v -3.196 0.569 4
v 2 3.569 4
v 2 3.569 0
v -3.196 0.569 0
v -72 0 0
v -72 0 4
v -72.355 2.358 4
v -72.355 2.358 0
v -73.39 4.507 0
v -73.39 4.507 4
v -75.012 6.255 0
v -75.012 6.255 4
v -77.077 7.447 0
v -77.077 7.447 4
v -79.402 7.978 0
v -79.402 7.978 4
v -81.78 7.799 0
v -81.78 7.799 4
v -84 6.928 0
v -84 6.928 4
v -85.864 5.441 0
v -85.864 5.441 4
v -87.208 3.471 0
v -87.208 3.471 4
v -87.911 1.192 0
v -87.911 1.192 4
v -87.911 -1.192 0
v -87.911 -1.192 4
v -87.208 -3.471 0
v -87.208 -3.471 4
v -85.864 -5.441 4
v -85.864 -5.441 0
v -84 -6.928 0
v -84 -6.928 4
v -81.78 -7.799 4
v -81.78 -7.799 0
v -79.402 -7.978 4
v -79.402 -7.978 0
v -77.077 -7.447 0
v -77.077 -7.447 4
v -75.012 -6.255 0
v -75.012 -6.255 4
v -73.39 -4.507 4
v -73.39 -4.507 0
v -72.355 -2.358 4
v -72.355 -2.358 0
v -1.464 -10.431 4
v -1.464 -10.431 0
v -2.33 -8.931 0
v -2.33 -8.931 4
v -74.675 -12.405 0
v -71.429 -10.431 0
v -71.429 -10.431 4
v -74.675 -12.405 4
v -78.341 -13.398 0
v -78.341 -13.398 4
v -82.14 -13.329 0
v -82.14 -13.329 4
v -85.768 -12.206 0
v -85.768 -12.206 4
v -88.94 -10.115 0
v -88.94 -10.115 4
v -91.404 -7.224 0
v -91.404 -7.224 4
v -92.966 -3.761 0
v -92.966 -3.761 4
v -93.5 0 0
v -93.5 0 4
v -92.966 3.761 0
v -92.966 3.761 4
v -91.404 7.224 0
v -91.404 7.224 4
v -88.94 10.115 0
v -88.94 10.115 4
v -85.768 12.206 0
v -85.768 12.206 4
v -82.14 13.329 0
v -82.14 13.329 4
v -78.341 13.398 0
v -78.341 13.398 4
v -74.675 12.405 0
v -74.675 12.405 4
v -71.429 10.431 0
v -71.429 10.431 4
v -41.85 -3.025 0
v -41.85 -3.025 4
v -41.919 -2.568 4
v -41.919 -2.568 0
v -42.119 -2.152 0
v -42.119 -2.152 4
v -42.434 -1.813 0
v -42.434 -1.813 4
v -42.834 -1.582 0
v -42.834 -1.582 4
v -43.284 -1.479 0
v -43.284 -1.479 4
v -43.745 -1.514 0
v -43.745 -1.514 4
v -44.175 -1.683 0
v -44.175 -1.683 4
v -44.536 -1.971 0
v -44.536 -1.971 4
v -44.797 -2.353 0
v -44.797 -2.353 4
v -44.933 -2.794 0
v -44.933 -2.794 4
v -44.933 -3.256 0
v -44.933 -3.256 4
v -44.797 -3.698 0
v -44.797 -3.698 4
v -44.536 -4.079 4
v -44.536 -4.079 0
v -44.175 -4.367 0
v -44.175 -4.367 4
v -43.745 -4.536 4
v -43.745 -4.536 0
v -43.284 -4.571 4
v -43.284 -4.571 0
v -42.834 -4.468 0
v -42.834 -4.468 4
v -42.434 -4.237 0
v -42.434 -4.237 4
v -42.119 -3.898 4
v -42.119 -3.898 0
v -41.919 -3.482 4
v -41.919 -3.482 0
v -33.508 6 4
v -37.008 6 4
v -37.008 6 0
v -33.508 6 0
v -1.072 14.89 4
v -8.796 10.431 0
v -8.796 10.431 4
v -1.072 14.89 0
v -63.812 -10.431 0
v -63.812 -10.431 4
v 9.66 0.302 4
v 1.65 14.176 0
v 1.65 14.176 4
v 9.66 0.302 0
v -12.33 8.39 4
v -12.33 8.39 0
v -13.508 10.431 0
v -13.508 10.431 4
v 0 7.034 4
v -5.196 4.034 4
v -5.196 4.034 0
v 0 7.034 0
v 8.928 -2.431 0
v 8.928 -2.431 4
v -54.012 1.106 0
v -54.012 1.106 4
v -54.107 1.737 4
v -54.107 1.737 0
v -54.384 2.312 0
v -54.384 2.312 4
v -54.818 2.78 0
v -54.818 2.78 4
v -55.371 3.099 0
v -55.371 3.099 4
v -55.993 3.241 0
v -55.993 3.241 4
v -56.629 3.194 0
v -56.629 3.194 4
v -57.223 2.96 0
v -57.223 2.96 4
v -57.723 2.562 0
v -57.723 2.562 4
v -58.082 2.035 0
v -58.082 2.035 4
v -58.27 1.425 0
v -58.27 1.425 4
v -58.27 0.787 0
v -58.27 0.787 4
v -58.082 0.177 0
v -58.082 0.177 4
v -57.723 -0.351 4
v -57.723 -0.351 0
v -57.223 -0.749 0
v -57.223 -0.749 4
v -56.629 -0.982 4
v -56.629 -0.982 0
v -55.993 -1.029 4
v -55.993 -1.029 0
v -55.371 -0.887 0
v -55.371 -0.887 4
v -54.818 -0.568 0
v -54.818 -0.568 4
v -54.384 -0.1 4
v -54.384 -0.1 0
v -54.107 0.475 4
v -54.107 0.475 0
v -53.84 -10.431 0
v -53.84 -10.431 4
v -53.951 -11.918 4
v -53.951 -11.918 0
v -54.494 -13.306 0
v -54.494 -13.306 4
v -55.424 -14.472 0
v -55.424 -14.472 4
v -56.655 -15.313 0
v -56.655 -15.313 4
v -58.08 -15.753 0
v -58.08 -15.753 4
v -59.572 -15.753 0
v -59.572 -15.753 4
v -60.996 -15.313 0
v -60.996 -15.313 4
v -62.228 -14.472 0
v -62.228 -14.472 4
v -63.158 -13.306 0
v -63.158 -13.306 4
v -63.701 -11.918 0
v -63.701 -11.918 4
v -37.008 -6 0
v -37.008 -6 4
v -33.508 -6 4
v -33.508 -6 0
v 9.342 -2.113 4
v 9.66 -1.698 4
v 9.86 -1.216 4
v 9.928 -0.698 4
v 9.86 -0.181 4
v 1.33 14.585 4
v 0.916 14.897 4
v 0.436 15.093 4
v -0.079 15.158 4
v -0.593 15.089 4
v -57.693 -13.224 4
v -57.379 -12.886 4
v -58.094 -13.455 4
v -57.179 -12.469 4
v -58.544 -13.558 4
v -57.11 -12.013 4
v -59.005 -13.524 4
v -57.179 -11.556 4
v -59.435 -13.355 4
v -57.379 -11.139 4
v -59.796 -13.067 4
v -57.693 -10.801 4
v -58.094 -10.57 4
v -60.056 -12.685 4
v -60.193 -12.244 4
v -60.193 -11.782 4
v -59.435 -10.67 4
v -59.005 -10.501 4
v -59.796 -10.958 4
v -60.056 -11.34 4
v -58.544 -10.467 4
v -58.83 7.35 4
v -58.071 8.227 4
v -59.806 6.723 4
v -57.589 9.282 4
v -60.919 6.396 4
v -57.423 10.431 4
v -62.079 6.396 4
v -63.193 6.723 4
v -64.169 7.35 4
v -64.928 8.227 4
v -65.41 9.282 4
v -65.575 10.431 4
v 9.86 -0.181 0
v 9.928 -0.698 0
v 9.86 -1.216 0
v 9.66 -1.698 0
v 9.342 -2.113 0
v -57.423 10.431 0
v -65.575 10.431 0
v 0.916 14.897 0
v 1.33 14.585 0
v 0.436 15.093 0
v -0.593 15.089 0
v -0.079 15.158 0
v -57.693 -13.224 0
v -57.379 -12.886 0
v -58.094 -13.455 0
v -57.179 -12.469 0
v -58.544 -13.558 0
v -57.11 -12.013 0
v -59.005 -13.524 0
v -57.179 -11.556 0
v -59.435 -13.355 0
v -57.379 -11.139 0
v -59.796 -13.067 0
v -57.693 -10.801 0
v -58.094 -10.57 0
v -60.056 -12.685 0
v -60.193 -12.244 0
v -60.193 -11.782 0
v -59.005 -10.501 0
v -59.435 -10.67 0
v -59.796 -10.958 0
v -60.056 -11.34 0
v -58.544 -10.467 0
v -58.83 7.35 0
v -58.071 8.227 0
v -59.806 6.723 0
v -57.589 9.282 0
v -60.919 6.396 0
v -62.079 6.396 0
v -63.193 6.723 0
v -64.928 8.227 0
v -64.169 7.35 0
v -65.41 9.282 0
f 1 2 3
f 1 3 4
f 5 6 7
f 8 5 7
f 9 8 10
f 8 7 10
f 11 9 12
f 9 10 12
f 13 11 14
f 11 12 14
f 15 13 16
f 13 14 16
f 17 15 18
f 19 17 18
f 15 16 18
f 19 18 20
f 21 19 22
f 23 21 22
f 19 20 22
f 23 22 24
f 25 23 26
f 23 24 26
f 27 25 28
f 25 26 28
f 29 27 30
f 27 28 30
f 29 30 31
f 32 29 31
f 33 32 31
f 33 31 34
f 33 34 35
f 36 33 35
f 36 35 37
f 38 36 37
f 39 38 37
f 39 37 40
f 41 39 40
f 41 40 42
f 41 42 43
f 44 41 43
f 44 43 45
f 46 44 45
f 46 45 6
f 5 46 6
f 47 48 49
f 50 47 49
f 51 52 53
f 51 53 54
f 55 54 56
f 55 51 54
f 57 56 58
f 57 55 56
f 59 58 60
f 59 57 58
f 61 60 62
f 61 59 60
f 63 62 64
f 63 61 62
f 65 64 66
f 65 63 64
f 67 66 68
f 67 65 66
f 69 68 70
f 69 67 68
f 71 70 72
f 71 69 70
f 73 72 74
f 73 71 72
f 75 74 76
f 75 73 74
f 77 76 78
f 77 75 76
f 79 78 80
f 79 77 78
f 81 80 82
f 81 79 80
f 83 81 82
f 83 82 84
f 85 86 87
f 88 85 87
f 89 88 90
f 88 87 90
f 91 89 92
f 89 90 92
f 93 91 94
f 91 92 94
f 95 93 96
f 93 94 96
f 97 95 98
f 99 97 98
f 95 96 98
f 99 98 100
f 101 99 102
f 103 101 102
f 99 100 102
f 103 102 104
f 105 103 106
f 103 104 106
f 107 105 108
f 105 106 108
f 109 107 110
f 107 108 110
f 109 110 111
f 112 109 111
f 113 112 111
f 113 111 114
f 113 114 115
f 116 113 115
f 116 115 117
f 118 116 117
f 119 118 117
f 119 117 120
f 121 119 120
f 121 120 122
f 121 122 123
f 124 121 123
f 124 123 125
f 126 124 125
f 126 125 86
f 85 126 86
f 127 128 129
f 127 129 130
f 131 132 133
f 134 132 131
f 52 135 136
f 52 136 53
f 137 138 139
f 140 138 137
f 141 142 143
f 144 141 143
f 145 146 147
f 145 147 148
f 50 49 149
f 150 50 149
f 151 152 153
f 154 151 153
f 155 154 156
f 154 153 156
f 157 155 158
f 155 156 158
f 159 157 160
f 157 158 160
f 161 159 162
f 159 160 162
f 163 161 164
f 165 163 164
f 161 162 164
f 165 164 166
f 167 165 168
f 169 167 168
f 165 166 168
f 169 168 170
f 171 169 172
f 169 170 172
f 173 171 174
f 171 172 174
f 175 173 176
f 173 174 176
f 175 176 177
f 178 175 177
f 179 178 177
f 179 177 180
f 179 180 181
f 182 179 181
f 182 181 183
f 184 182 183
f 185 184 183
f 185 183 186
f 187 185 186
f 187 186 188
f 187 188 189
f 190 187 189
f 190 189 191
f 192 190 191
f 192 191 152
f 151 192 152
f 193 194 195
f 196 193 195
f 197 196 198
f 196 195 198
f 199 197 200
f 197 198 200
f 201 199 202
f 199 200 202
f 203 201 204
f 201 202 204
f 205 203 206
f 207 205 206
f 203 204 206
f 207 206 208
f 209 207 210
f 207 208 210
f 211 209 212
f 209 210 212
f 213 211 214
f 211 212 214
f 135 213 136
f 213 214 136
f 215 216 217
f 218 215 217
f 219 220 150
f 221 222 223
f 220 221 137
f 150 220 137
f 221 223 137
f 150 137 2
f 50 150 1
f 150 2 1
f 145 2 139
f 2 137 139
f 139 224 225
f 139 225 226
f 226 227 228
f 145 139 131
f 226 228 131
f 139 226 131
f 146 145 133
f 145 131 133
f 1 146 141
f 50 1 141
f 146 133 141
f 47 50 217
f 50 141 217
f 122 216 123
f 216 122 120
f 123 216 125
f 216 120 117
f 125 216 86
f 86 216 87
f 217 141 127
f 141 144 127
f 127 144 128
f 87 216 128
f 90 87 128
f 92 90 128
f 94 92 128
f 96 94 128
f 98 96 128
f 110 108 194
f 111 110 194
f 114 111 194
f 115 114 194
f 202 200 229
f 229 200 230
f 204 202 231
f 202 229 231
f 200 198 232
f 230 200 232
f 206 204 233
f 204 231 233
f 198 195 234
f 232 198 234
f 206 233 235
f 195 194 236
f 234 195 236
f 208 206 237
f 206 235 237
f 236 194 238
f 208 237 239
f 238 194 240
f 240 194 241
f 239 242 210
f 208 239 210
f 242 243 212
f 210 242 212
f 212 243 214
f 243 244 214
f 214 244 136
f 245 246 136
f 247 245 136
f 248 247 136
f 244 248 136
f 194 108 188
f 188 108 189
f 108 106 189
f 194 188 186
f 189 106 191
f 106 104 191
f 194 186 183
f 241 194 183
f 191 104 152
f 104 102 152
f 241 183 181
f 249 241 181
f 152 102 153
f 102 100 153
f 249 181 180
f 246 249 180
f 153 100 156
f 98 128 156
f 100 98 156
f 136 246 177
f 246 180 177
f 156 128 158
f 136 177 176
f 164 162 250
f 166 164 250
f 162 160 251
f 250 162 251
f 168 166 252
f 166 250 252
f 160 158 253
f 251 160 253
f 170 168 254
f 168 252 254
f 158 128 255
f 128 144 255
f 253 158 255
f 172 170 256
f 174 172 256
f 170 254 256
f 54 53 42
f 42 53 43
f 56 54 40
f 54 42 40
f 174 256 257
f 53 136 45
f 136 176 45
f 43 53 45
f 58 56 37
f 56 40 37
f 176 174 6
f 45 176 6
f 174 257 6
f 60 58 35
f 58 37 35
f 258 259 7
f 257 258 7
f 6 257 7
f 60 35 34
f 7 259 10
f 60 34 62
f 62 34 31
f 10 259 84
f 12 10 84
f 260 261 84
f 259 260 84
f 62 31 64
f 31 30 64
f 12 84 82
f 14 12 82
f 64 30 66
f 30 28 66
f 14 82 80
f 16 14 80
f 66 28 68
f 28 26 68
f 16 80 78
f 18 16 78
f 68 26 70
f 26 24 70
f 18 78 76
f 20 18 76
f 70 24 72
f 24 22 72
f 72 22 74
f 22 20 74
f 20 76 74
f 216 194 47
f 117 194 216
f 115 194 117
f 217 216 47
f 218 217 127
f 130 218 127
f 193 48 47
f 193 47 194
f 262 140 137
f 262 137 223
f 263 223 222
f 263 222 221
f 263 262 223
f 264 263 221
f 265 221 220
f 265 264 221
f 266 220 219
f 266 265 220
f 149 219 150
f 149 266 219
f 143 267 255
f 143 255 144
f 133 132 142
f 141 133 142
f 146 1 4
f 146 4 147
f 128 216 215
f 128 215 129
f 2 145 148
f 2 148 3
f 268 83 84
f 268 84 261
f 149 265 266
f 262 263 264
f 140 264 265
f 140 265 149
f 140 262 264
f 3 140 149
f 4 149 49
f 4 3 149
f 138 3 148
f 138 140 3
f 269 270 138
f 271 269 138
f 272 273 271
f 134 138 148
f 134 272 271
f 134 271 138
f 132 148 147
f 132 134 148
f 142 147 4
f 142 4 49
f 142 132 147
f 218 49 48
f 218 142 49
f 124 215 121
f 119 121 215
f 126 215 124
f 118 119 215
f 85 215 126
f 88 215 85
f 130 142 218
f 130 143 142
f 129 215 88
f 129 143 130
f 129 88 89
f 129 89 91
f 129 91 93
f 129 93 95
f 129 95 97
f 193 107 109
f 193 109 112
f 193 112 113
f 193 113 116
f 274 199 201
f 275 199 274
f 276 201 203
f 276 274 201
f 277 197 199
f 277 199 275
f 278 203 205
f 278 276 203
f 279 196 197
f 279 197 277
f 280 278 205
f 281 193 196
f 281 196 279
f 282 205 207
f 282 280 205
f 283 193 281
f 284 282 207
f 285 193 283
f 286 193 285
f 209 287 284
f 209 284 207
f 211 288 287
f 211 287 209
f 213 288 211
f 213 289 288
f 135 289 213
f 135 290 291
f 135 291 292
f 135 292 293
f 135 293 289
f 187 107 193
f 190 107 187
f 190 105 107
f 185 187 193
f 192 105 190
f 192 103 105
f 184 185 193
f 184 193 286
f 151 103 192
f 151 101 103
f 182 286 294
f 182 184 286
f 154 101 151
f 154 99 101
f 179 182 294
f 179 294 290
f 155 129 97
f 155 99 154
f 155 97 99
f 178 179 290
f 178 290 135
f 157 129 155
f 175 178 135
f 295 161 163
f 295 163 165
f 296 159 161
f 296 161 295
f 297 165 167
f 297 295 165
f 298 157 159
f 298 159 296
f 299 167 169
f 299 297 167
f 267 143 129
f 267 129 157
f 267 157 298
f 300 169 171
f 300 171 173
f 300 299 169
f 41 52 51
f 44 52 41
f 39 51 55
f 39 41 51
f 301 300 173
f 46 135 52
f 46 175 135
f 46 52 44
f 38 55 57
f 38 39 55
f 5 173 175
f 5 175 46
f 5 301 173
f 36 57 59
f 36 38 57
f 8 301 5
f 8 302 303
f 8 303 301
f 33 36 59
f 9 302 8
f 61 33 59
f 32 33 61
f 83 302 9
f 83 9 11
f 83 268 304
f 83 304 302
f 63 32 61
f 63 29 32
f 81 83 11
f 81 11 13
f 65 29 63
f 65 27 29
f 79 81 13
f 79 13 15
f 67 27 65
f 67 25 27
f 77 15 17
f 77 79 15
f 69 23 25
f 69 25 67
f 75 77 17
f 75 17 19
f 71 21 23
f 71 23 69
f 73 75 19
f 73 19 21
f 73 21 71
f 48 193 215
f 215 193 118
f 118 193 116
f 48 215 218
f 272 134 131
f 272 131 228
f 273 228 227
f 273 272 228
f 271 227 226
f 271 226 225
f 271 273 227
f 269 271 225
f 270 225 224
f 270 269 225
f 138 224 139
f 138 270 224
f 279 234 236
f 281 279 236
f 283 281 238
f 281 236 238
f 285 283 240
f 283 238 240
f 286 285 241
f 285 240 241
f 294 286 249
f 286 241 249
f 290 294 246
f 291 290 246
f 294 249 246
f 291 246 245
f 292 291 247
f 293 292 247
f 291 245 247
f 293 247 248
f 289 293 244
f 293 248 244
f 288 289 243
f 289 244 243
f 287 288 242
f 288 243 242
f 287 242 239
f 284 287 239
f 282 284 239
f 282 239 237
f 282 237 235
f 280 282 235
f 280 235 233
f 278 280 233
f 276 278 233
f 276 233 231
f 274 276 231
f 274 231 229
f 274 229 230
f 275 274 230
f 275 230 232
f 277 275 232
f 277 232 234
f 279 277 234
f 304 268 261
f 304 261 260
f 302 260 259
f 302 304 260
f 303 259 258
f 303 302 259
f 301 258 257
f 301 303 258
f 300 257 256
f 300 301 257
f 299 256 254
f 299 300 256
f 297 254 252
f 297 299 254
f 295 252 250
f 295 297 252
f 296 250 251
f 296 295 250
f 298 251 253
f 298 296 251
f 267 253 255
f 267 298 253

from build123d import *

# Parameters (mm, degrees)
AUFSATZ_LINEAR_AUSTRAGEN1_DEPTH = 4
SCHNITT_LINEAR_AUSTRAGEN1_REACH = 6
SKIZZE2_R                       = 8
SKIZZE2_R_2                     = 2.141321697
SCHNITT_LINEAR_START            = -4
SCHNITT_LINEAR_AUSTRAGEN2_DEPTH = 4
AUFSATZ_LINEAR_AUSTRAGEN3_DEPTH = 4
SCHNITT_LINEAR_AUSTRAGEN3_REACH = 6
SKIZZE5_W                       = 3.5
SKIZZE5_H                       = 12
AUFSATZ_LINEAR_AUSTRAGEN4_DEPTH = 4
SKIZZE7_R                       = 1.55
SCHNITT_LINEAR_AUSTRAGEN4_DEPTH = 10


with BuildPart() as part:
    # Skizze1 → Aufsatz-Linear austragen1 (new body)
    with BuildSketch(Plane.XY):
        with BuildLine():
            Line((8.570550732, -10.430515814), (-71.429449268, -10.430515814))
            ThreePointArc((-71.429449268, -10.430515814), (-93.5, 0), (-71.429449268, 10.430515814))
            Line((-71.429449268, 10.430515814), (-65.575289804, 10.430515814))
            ThreePointArc((-65.575289804, 10.430515814), (-61.49939442, 6.35462043), (-57.423499036, 10.430515814))
            Line((-57.423499036, 10.430515814), (8.570550732, 10.430515814))
            ThreePointArc((8.570550732, 10.430515814), (19.001066546, 0), (8.570550732, -10.430515814))
        make_face()
    extrude(amount=AUFSATZ_LINEAR_AUSTRAGEN1_DEPTH)

    # Skizze2 → Schnitt-Linear austragen1 (cut, up to next)
    with BuildSketch(Plane.XY.offset(4), mode=Mode.PRIVATE) as schnitt_linear_austragen1_sk1:
        with Locations((-80, 0)):
            Circle(SKIZZE2_R)
    schnitt_linear_austragen1_tool1 = extrude(schnitt_linear_austragen1_sk1.sketch, amount=-SCHNITT_LINEAR_AUSTRAGEN1_REACH, mode=Mode.PRIVATE) & part.part
    add(schnitt_linear_austragen1_tool1.solids().sort_by_distance((-80, 0, 4))[0], mode=Mode.SUBTRACT)
    # Skizze2 → Schnitt-Linear austragen1 (cut, up to next)
    with BuildSketch(Plane.XY.offset(4), mode=Mode.PRIVATE) as schnitt_linear_austragen1_sk2:
        with Locations((-56.152824314, 1.105869461)):
            Circle(SKIZZE2_R_2)
    schnitt_linear_austragen1_tool2 = extrude(schnitt_linear_austragen1_sk2.sketch, amount=-SCHNITT_LINEAR_AUSTRAGEN1_REACH, mode=Mode.PRIVATE) & part.part
    add(schnitt_linear_austragen1_tool2.solids().sort_by_distance((-56.152824, 1.105869, 4))[0], mode=Mode.SUBTRACT)
    # Skizze2 → Schnitt-Linear austragen1 (cut, up to next)
    with BuildSketch(Plane.XY.offset(4), mode=Mode.PRIVATE) as schnitt_linear_austragen1_sk3:
        Polygon((-5.196152423, 4.033585801), (0, 7.033585801), (2, 3.569484186), (-3.196152423, 0.569484186), align=None)
    schnitt_linear_austragen1_tool3 = extrude(schnitt_linear_austragen1_sk3.sketch, amount=-SCHNITT_LINEAR_AUSTRAGEN1_REACH, mode=Mode.PRIVATE) & part.part
    add(schnitt_linear_austragen1_tool3.solids().sort_by_distance((-1.598076, 3.801535, 4))[0], mode=Mode.SUBTRACT)

    # Skizze3 → Schnitt-Linear austragen2 (cut)
    with BuildSketch(Plane.XY.offset(4).offset(SCHNITT_LINEAR_START)):
        Polygon((12.98673942, 30.628285162), (33.019811303, -4.070013171), (4.402698179, -20.592111136), (-2.330127019, -8.930515814), (8.92820323, -2.430515814), (-1.07179677, 14.889992262), (-12.330127019, 8.389992262), (-15.630373703, 14.106187196), align=None)
    extrude(amount=SCHNITT_LINEAR_AUSTRAGEN2_DEPTH, mode=Mode.SUBTRACT)

    # Skizze4 → Aufsatz-Linear austragen3 (add)
    with BuildSketch(Plane.XY):
        with BuildLine():
            Line((-8.795836552, 10.430515814), (-1.07179677, 14.889992262))
            ThreePointArc((-1.07179677, 14.889992262), (0.435735022, 15.092552947), (1.649755119, 14.176126114))
            Line((1.649755119, 14.176126114), (9.66025479, 0.301533691))
            ThreePointArc((9.66025479, 0.301533691), (9.860054688, -1.216103823), (8.92820323, -2.430515814))
            Line((8.92820323, -2.430515814), (1.502883158, 10.430515814))
            Line((1.502883158, 10.430515814), (-8.795836552, 10.430515814))
        make_face()
    extrude(amount=AUFSATZ_LINEAR_AUSTRAGEN3_DEPTH)

    # Skizze5 → Schnitt-Linear austragen3 (cut, up to next)
    with BuildSketch(Plane.XY.offset(4), mode=Mode.PRIVATE) as schnitt_linear_austragen3_sk1:
        with Locations((-35.258223841, 0)):
            Rectangle(SKIZZE5_W, SKIZZE5_H)
    schnitt_linear_austragen3_tool1 = extrude(schnitt_linear_austragen3_sk1.sketch, amount=-SCHNITT_LINEAR_AUSTRAGEN3_REACH, mode=Mode.PRIVATE) & part.part
    add(schnitt_linear_austragen3_tool1.solids().sort_by_distance((-35.258224, 0, 4))[0], mode=Mode.SUBTRACT)

    # Skizze6 → Aufsatz-Linear austragen4 (add)
    with BuildSketch(Plane.XY.offset(4)):
        with BuildLine():
            Line((-63.811678178, -10.430515814), (-53.840299994, -10.430515814))
            ThreePointArc((-53.840299994, -10.430515814), (-58.825989086, -15.808542635), (-63.811678178, -10.430515814))
        make_face()
    extrude(amount=-AUFSATZ_LINEAR_AUSTRAGEN4_DEPTH)

    # Skizze7 → Schnitt-Linear austragen4 (cut)
    with BuildSketch(Plane.XY.offset(4)):
        with Locations((-58.659847502, -12.012547734)):
            Circle(SKIZZE7_R)
        with Locations((-43.4, -3.025056359)):
            Circle(SKIZZE7_R)
    extrude(amount=-SCHNITT_LINEAR_AUSTRAGEN4_DEPTH, mode=Mode.SUBTRACT)


solid = part.part
